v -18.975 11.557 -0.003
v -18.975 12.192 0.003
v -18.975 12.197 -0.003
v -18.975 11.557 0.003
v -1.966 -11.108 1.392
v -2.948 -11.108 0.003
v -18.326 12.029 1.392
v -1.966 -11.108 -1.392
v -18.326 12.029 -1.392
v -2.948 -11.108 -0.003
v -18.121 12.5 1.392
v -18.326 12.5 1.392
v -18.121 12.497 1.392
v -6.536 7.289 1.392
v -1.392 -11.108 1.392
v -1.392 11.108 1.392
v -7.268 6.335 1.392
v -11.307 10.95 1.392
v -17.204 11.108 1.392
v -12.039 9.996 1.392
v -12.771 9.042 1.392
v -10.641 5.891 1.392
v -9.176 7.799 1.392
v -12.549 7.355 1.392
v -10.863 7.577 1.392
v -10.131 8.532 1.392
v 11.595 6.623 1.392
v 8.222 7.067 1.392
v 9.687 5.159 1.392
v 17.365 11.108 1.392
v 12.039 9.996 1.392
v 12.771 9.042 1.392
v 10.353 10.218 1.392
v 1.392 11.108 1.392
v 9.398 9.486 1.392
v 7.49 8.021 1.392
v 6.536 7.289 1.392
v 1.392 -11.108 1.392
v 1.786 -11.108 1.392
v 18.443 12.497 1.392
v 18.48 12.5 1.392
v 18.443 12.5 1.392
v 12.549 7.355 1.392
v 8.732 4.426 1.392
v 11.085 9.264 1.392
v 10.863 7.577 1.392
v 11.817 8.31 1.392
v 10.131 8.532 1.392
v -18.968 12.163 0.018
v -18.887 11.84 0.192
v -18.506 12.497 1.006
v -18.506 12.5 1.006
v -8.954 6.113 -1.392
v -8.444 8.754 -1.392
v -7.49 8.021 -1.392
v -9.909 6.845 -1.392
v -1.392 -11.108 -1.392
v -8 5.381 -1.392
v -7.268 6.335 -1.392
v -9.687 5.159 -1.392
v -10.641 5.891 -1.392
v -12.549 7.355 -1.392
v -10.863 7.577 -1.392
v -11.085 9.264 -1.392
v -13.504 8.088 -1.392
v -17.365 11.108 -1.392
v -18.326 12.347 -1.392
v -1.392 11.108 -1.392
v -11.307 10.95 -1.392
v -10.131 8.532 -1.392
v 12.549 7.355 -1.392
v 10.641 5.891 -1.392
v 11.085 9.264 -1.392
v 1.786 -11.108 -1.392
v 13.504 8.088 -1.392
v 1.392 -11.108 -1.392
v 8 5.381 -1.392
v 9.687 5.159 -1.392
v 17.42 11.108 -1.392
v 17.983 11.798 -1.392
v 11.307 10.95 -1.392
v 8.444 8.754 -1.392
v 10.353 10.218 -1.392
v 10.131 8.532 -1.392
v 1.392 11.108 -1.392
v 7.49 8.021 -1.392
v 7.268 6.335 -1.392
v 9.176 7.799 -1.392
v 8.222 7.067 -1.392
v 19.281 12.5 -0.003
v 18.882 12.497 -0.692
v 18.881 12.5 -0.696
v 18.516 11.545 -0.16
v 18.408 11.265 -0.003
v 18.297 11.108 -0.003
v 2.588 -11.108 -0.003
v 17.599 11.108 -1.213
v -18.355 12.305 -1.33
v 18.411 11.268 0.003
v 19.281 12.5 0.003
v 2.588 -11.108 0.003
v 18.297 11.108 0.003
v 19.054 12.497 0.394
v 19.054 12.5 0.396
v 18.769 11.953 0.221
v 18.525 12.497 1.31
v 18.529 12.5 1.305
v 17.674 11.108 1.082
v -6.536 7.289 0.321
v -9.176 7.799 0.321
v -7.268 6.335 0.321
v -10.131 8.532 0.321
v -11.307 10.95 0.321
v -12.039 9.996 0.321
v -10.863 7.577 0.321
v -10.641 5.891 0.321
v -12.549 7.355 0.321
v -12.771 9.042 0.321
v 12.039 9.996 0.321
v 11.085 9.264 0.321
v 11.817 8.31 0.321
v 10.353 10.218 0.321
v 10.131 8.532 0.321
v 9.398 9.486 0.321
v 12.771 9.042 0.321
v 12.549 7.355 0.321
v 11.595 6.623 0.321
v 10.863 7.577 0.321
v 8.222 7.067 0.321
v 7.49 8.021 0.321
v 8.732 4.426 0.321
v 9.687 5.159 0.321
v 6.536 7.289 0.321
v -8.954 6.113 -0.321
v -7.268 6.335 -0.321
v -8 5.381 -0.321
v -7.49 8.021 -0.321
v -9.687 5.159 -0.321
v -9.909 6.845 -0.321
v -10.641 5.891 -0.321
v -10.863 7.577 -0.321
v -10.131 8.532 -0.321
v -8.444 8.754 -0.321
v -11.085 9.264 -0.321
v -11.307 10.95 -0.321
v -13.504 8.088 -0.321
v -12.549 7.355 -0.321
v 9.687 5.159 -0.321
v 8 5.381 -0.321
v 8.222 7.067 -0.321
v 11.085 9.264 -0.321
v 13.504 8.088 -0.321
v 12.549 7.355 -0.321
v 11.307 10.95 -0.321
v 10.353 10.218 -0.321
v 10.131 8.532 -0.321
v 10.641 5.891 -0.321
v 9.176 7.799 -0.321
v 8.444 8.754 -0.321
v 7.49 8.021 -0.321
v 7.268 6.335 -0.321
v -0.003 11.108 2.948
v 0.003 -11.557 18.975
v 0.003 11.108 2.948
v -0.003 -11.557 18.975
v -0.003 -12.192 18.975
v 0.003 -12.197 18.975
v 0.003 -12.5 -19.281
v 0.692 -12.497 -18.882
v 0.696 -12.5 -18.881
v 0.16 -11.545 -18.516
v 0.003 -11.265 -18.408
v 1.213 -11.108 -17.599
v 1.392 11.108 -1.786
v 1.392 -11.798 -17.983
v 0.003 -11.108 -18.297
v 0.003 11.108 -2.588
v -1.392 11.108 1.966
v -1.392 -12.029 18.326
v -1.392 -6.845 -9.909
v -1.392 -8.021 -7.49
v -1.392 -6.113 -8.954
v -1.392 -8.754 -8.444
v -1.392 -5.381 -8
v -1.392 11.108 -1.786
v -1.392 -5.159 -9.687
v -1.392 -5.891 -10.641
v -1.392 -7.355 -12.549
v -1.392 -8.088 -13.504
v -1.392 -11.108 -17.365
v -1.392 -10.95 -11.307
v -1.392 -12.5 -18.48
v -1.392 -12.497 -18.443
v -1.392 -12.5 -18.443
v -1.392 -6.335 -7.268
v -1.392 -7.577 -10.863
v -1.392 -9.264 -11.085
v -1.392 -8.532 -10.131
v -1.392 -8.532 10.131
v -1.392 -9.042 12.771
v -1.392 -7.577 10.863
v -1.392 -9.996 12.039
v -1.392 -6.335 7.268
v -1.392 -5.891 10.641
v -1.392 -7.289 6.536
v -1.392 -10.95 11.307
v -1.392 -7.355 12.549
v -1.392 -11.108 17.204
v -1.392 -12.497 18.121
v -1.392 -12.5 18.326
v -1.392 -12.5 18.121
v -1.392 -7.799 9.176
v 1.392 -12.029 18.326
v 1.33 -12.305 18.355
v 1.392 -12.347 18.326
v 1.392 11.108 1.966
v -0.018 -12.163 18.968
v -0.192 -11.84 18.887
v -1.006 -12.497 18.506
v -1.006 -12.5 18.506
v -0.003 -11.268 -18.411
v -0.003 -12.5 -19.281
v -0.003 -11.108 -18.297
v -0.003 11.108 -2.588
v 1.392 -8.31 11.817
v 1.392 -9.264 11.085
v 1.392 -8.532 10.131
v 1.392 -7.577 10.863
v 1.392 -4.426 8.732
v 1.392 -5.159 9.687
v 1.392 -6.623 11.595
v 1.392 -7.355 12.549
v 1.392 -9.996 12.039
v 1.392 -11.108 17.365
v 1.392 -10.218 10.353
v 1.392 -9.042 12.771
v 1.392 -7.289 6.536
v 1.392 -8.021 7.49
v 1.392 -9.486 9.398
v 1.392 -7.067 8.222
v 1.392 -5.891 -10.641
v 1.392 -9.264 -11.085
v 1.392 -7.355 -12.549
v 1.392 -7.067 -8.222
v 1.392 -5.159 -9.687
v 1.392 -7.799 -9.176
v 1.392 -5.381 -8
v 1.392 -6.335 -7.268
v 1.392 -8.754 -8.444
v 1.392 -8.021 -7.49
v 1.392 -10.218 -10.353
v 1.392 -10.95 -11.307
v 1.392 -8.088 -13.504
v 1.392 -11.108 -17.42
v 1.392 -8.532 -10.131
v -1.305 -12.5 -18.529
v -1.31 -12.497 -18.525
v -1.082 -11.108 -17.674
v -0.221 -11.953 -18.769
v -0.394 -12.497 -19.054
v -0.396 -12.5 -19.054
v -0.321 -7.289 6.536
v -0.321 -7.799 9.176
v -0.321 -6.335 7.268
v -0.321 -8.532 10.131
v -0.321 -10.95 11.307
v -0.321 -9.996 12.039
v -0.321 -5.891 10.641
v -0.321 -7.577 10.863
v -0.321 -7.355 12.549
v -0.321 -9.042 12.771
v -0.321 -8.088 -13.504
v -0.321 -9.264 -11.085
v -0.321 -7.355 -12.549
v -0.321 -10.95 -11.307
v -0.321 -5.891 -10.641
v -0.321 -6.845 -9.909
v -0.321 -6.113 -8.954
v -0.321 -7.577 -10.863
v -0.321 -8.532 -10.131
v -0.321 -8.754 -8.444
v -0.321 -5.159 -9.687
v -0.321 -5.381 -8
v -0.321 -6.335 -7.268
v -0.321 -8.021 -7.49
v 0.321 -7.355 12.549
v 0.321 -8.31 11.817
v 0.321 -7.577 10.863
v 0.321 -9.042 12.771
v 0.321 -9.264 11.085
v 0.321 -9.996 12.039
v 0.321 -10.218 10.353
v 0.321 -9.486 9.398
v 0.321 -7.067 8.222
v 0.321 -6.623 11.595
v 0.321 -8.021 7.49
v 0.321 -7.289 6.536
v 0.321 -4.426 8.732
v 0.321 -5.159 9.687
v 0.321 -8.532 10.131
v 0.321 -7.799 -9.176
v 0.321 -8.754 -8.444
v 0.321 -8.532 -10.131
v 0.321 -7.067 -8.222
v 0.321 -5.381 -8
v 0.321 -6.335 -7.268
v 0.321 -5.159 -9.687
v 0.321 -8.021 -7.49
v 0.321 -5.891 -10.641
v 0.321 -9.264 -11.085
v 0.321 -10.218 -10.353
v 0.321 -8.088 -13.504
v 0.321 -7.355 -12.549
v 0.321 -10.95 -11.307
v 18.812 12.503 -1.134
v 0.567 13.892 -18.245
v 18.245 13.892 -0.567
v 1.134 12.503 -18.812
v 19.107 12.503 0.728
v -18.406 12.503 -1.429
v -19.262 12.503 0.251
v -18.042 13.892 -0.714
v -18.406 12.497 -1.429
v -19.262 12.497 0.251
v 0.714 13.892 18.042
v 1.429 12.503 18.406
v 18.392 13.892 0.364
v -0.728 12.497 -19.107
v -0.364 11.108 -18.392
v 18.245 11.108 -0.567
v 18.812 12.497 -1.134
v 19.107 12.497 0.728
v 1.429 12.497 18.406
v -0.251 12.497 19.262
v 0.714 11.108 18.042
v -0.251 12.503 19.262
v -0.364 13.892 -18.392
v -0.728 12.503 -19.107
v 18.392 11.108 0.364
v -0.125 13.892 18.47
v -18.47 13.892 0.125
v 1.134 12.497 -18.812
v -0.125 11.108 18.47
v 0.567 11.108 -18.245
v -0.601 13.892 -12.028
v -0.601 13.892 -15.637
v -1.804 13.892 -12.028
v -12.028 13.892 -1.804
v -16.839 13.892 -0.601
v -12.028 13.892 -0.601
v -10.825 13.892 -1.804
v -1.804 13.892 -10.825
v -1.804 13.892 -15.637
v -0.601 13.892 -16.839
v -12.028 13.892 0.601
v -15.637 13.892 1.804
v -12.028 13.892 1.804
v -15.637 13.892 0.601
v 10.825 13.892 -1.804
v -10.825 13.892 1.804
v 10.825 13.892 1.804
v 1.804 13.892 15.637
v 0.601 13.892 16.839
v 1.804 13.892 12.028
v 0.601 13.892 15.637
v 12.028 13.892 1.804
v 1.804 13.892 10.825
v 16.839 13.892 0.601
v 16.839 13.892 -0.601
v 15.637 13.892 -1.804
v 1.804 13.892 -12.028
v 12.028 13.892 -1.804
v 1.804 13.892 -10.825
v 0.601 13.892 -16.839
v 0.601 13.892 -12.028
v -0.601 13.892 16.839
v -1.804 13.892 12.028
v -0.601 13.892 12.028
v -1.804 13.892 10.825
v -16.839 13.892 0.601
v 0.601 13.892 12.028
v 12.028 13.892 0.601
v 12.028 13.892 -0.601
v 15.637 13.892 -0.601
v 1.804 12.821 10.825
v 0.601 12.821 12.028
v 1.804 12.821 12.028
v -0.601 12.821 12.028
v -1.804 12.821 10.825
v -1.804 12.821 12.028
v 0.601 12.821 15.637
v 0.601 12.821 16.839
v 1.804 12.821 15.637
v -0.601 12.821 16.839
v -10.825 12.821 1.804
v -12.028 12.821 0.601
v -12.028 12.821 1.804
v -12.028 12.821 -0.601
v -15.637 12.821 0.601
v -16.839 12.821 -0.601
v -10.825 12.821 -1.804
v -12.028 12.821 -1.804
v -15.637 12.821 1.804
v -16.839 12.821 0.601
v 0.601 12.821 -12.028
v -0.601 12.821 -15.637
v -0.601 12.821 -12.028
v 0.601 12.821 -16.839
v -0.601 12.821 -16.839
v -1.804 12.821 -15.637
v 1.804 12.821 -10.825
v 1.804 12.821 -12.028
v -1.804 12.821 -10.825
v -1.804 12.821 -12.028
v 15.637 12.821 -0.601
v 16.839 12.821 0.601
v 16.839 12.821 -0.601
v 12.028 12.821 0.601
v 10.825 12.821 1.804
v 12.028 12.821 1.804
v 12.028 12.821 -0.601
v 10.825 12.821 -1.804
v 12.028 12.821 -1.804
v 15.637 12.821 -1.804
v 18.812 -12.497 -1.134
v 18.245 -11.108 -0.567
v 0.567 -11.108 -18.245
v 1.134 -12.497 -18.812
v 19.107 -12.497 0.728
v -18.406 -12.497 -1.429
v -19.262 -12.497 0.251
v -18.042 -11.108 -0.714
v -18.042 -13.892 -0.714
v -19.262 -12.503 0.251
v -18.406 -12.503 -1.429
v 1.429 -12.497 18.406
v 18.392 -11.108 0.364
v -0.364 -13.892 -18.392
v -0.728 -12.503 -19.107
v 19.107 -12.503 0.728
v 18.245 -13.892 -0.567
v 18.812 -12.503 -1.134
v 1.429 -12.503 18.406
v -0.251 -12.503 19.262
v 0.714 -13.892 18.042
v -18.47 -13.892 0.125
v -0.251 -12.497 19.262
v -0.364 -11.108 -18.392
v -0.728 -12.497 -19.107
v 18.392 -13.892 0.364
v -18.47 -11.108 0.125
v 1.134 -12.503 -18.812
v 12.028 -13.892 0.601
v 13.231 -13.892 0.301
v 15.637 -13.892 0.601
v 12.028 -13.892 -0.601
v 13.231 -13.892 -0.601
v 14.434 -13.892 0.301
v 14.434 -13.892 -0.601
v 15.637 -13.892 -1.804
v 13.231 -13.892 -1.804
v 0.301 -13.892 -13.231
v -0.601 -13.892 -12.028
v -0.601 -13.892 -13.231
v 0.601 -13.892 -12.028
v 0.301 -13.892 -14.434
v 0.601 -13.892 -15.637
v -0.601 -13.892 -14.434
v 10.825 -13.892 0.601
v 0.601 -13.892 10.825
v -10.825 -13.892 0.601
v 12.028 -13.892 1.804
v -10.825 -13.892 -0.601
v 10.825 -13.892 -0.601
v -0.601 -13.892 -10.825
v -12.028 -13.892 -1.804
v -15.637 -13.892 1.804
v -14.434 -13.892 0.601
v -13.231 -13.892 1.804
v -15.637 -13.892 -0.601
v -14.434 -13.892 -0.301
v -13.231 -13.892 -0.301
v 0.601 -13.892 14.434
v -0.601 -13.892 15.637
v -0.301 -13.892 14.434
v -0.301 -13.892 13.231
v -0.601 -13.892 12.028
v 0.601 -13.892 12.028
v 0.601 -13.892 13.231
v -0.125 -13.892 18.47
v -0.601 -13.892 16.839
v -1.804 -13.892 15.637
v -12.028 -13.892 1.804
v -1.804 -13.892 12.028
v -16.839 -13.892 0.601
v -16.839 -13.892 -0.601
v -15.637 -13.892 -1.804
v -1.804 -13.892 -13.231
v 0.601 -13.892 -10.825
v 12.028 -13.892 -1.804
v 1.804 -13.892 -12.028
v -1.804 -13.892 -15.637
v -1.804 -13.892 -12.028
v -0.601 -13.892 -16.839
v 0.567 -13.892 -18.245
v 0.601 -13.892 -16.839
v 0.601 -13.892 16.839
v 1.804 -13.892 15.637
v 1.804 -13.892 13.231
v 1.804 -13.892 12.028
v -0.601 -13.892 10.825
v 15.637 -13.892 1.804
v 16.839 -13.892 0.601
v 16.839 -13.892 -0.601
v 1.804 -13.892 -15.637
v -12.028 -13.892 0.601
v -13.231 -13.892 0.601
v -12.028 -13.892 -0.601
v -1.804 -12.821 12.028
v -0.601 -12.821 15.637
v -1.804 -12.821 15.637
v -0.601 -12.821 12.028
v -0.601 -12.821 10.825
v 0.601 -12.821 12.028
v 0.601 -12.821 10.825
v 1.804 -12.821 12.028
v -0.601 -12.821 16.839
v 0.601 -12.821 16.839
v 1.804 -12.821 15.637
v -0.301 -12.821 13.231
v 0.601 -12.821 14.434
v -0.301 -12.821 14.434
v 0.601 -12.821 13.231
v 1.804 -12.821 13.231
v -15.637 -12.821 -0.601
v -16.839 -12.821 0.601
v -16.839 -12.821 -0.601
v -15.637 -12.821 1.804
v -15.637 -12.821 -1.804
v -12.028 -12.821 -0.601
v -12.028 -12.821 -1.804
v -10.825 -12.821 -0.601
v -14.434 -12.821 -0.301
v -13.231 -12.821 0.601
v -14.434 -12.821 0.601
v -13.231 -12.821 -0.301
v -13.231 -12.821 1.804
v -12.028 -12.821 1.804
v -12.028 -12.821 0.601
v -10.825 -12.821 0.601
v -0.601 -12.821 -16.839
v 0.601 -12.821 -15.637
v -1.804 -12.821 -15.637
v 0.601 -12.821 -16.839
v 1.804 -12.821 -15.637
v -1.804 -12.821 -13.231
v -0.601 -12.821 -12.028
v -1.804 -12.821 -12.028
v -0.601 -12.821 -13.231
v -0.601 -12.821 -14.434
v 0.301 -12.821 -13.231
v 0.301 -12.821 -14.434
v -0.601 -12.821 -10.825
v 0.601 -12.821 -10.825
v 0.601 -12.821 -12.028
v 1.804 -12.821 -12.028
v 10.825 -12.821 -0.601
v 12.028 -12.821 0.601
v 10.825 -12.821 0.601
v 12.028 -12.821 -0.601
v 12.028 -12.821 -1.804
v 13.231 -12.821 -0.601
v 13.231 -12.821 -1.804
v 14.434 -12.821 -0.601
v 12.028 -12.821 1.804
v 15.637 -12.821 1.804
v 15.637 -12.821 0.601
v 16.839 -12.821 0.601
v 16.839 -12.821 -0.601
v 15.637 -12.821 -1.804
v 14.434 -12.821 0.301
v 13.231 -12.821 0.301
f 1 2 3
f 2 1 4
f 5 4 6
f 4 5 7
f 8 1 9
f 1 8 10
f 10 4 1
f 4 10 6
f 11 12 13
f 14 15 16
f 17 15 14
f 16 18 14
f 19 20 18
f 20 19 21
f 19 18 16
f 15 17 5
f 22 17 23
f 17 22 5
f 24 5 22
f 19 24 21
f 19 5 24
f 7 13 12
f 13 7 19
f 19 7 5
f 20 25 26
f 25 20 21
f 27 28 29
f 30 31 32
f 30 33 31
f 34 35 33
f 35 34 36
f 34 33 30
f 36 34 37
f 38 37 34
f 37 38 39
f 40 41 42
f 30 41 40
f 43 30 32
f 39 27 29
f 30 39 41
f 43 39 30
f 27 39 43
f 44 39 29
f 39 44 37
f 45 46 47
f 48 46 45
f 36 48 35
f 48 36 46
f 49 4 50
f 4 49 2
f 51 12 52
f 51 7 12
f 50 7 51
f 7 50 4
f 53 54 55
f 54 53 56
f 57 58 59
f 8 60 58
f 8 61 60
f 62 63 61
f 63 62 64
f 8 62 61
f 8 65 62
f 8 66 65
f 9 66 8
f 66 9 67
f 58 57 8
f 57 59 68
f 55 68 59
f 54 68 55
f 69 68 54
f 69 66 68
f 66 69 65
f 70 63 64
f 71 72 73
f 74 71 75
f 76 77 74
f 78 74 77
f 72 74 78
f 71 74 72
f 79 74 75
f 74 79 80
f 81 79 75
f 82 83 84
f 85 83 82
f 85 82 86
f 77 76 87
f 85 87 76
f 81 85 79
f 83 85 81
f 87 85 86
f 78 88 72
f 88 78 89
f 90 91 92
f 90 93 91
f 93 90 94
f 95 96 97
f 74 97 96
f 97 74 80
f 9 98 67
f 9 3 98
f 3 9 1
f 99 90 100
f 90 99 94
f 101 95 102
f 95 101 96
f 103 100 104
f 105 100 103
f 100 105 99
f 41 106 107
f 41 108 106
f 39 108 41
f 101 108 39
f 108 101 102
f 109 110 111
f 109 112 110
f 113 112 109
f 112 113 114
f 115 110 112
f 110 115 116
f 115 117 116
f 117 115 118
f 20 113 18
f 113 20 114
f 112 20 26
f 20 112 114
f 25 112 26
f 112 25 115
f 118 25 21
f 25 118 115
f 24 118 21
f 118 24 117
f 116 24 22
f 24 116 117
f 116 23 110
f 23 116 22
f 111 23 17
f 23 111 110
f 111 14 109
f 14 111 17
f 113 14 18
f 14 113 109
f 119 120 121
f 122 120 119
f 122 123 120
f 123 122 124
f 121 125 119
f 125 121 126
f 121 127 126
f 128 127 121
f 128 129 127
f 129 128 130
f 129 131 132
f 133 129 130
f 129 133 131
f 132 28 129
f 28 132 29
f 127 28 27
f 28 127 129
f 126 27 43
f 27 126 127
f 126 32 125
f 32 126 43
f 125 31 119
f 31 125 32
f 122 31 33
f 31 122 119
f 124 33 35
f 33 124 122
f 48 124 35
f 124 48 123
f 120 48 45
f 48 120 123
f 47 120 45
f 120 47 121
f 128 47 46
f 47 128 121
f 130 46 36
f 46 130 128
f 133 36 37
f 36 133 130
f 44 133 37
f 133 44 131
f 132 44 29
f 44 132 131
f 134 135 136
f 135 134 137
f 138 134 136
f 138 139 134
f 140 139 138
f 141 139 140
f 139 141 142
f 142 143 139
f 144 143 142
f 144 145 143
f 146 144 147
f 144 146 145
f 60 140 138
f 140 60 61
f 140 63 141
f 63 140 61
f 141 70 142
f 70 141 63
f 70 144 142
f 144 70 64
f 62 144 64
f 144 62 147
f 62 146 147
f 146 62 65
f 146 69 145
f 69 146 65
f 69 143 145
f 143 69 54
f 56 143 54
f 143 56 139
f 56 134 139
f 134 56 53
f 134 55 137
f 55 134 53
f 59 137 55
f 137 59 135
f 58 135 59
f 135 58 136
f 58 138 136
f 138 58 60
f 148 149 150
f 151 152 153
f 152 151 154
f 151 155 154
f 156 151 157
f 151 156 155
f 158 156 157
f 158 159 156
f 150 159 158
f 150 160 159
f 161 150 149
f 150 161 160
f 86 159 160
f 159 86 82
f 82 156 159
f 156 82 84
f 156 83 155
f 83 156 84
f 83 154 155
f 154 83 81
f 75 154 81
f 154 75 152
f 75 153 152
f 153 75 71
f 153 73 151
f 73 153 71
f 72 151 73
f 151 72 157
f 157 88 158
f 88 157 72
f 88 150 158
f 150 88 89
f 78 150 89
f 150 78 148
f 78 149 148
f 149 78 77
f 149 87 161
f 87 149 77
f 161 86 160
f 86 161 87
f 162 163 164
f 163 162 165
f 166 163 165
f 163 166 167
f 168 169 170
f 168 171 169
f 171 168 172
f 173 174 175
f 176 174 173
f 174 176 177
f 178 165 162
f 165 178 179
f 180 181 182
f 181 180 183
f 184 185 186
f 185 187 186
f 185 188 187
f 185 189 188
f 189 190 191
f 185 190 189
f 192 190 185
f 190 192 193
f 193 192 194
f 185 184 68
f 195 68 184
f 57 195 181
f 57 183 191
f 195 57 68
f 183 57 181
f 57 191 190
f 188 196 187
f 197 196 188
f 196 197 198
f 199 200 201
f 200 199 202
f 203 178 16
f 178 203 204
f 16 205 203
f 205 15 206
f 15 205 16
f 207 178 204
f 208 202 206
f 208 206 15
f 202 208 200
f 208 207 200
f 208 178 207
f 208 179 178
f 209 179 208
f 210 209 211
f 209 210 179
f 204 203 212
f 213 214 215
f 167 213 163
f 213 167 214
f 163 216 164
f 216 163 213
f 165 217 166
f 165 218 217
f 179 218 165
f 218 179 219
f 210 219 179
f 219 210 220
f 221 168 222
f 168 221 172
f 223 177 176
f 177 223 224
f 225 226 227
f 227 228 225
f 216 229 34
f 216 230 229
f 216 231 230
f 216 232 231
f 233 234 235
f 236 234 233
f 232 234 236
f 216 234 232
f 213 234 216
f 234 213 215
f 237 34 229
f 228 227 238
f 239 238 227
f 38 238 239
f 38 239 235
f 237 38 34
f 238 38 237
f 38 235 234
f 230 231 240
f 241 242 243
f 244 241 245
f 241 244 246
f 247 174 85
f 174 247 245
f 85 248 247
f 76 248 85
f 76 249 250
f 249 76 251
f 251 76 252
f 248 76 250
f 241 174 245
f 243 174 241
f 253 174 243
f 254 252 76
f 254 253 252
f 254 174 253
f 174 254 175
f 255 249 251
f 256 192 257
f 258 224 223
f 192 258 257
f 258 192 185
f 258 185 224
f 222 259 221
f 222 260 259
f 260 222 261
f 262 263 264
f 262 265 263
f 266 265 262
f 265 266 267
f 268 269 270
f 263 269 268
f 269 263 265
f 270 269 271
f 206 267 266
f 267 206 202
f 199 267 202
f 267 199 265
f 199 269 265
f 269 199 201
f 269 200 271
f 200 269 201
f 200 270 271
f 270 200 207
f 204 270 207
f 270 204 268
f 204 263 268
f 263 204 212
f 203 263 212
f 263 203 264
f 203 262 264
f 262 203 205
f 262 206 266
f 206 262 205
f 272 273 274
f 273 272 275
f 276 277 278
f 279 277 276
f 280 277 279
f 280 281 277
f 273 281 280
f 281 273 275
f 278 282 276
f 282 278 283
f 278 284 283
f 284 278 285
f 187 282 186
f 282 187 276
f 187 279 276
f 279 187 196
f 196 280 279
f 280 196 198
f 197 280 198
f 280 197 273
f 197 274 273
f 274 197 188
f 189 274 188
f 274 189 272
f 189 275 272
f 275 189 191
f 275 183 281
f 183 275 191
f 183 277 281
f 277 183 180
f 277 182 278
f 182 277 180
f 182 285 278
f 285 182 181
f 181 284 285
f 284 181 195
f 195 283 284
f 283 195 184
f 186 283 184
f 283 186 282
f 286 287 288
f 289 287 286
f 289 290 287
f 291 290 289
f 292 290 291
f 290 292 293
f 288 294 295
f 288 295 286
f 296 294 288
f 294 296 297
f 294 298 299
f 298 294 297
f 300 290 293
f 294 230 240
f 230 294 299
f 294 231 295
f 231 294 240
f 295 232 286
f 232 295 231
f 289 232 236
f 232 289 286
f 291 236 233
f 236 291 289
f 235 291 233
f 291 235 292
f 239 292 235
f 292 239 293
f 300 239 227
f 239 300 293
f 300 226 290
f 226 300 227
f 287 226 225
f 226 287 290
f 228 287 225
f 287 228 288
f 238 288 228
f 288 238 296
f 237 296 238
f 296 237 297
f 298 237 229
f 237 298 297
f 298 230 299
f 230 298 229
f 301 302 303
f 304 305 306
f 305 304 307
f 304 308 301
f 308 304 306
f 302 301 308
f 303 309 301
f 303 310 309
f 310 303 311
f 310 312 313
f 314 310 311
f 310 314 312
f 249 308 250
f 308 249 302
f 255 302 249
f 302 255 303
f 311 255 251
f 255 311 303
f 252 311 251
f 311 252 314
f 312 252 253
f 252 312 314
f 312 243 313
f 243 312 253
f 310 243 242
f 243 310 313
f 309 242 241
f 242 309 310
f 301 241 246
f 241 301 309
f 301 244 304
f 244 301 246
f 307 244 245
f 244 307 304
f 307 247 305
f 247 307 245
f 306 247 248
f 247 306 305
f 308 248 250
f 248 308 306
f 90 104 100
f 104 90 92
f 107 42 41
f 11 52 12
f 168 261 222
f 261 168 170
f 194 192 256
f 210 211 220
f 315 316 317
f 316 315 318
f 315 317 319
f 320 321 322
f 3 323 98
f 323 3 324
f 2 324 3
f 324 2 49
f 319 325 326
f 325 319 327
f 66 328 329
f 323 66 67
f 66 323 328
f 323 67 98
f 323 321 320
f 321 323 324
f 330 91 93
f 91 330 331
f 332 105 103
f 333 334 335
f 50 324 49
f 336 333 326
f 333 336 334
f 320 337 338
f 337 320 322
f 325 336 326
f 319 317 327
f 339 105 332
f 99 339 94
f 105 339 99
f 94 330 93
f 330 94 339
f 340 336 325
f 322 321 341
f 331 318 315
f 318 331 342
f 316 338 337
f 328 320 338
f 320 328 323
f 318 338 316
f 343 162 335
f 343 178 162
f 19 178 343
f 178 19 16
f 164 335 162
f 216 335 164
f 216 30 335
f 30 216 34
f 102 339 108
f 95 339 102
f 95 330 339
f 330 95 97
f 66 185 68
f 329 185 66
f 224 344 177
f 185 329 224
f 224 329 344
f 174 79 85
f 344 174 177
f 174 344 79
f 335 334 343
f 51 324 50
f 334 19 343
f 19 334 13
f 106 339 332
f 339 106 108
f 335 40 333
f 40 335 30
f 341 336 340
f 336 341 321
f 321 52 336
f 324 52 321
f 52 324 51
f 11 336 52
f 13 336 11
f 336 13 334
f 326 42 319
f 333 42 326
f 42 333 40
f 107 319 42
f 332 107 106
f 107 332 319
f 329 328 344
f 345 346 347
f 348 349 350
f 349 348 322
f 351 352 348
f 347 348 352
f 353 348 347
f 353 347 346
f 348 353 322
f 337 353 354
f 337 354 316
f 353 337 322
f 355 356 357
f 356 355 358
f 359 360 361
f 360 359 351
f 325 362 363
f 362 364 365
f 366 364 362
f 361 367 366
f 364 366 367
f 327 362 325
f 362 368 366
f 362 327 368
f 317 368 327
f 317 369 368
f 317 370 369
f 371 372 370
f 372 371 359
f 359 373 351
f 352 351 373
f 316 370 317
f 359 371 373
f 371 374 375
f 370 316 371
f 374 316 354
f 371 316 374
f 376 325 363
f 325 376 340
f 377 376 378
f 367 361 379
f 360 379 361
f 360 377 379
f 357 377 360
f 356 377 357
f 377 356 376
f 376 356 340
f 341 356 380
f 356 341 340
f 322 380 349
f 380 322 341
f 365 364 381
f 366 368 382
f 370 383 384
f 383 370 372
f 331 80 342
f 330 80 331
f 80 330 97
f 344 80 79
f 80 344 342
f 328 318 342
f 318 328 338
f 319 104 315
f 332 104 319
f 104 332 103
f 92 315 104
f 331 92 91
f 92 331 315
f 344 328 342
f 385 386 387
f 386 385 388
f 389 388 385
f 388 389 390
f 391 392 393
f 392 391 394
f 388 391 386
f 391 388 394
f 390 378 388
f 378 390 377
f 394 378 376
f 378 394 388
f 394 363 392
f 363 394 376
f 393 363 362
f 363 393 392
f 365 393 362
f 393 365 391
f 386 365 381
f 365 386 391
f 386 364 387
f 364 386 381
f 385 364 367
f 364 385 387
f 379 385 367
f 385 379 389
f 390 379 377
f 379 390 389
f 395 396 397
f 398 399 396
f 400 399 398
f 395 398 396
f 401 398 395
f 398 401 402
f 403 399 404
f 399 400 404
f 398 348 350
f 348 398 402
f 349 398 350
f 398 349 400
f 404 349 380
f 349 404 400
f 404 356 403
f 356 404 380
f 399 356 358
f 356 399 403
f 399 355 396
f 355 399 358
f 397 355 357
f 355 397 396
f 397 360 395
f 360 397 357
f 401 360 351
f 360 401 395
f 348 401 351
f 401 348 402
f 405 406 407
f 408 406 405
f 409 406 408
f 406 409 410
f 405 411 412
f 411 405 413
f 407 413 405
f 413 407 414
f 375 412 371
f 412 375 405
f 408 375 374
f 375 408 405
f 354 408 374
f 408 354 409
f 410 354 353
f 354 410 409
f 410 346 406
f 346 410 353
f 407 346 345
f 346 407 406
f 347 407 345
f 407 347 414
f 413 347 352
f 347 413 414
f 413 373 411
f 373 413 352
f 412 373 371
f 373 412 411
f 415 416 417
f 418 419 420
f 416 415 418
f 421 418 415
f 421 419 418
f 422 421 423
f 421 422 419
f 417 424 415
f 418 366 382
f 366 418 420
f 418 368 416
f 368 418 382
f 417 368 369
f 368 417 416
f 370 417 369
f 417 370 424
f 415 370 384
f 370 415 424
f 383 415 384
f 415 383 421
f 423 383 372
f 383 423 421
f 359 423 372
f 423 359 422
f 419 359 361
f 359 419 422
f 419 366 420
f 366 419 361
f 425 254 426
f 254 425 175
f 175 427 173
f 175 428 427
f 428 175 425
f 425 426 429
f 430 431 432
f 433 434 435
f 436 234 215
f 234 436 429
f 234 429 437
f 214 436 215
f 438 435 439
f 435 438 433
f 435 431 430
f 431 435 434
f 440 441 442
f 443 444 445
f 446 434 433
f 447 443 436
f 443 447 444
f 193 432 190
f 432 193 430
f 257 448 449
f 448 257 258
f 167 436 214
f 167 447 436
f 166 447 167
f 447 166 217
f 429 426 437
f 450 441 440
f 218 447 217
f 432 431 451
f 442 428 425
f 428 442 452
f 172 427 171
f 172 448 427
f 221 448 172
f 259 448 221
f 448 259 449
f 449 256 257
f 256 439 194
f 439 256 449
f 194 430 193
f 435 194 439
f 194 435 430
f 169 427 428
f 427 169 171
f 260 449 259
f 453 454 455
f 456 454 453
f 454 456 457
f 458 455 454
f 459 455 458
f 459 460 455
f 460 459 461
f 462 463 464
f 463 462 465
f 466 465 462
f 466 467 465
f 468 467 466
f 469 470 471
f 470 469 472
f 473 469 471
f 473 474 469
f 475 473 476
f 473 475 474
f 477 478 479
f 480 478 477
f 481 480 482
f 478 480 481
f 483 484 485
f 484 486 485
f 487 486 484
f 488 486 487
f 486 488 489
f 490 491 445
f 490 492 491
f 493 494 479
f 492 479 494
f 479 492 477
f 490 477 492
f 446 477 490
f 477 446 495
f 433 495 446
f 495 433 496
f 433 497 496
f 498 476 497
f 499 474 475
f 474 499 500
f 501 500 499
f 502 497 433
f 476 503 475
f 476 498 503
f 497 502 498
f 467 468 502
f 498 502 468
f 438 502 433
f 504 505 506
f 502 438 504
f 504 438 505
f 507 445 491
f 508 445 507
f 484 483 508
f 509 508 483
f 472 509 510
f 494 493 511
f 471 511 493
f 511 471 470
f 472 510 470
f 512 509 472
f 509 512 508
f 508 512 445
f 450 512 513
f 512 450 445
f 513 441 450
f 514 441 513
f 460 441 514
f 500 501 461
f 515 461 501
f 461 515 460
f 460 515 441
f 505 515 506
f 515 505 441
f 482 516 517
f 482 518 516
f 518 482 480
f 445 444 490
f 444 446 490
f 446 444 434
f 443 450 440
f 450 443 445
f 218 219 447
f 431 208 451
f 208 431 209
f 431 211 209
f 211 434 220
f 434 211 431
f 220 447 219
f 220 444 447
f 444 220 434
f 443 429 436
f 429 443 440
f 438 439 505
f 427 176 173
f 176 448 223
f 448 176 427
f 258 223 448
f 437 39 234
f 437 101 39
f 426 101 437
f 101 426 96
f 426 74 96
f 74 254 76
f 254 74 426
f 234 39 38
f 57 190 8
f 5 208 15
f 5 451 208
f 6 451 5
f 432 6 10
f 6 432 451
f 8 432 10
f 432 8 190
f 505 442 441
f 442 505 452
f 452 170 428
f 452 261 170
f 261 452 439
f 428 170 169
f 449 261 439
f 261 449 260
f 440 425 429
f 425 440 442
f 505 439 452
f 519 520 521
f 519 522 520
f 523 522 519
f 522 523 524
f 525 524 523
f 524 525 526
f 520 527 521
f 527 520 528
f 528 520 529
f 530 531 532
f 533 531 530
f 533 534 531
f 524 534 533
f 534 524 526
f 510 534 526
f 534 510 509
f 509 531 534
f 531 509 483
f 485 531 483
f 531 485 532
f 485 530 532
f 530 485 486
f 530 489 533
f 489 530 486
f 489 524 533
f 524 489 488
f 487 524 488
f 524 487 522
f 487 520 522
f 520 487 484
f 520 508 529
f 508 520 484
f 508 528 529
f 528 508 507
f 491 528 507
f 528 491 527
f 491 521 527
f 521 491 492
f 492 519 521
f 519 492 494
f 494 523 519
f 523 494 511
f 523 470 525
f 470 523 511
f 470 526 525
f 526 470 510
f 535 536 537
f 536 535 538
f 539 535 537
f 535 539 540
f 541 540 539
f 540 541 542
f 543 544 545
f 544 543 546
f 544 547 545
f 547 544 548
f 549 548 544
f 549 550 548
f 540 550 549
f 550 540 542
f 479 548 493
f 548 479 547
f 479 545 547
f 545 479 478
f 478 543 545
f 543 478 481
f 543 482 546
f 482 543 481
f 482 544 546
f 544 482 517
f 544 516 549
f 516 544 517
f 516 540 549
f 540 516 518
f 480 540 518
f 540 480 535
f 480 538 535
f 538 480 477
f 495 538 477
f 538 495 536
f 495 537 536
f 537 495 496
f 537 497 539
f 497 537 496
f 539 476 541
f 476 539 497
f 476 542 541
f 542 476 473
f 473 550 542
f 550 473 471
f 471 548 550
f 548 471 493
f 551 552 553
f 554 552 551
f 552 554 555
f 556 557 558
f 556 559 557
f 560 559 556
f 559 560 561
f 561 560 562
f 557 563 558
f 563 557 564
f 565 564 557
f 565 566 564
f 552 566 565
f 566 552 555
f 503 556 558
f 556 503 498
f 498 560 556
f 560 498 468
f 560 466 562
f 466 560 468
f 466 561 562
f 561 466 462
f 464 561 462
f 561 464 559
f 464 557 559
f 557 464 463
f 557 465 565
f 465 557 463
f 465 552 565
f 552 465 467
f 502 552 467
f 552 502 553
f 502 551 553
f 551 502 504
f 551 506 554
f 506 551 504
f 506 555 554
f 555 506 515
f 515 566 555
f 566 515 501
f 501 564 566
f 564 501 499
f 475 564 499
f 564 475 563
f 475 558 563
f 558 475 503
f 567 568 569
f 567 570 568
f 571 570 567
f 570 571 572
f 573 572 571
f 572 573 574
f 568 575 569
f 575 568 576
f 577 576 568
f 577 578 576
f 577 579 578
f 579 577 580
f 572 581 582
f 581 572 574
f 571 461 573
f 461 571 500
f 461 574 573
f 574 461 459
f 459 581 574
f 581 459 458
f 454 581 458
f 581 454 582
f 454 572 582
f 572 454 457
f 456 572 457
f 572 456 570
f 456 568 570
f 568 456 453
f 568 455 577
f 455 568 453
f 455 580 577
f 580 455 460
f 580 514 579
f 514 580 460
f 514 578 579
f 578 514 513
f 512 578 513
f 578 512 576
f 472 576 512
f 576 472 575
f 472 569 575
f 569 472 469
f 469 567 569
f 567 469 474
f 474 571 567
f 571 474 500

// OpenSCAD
diameter = 25*sqrt(3);
plane_thickness = diameter/27;
halfplane_emboss = plane_thickness / 5;
center_emboss = plane_thickness * 4/7;

module plane(){
	minkowski(){
 		linear_extrude(height=plane_thickness /300, center=true){
			child(0);
		}
		sphere(plane_thickness, $fn = 5);
	}
}

module halfplane(){
        translate([0,0,halfplane_emboss]){
	    linear_extrude(height=plane_thickness, center=false){
		child(0);
	    }
	}
}



module place(dir, dist=2/9){
f = diameter/36;
	rotate(dir){
	translate([0,diameter*dist,0]){
	halfplane(){
	scale([f,f,f]){
		translate([-1.5,0,0]){
			child(0);
		}
	}
	}
	}
	}
}

module tet_tri() {
	plane(){
		polygon(points=[
			[diameter * .5 * sqrt(2)/sqrt(3), diameter * .5 / sqrt(3)],
			[diameter * -.5 * sqrt(2)/sqrt(3), diameter * .5 / sqrt(3)],
			[0, diameter * -.5 / sqrt(3)]
		]);
	}
}

module hex_squ(){
	plane(){
		square([diameter / sqrt(3) ,diameter / sqrt(3)], center=true);
	}

}

one = [
	[0,0],[0,1],[1,1],[1,4],[0,4],[1,5],[2,5],[2,1],[3,1],[3,0]
];
two = [
	[0,0],[0,1],[2,3],[2,4],[1,4],[1,3],[0,3],[0,4],[1,5],[2,5],[3,4],[3,3],[1,1],[3,1],[3,0]
];
three = [
	[0,1],[2,1],[2,2],[0,2],[2,4],[0,4],[0,5],[3,5],[3,4],[2,3],[3,2],[3,1],[2,0],[1,0]
];
four = [
	[3,0],[2,0],[2,2],[0,2],[0,4],[1,5],[1,3],[2,3],[2,5],[3,5]
];
five = [
	[0,1],[2,1],[2,2],[0,2],[0,4],[0,5],[3,5],[3,4],[1,4],[1,3],[2,3],[3,2],[3,1],[2,0],[1,0]
];
six = [
	[0,1],[0,4,],[1,5,],[2,5,],[3,4],[1,4],[1,1],[2,1],[2,2],[1.25,2],[1.25,3],[2,3],[3,2],[3,1],[2,0],[1,0]
];

color("", 0.95){
   intersection(){
    union(){
	difference(){
		tet_tri();
		place([0,0,52.5]){polygon(points=four);}
		place([0,0,-52.5]){polygon(points=two);}
		place([0,180,52.5]){polygon(points=five);}
		place([0,180,-52.5]){polygon(points=three);}
		
	}
    rotate([0,90,180]) {
		difference(){
			tet_tri();
		place([0,0,52.5]){polygon(points=four);}
		place([0,0,-52.5]){polygon(points=five);}
		place([0,180,52.5]){polygon(points=two);}
		place([0,180,-52.5]){polygon(points=three);}
		}
	}
}
rotate(0, 0, 0){
cube([diameter, diameter/sqrt(3), diameter], center=true);
}
}
	translate([0,diameter/(2*sqrt(3)),0]){
		rotate([90,45,0]){
			difference(){
	   			hex_squ();
				place([0,180,45], 1/4){polygon(points=one);}
				place([0,180,135], 1/4){polygon(points=one);}
				place([0,180,-135], 1/4){polygon(points=one);}
				place([0,180,-45], 1/4){polygon(points=one);}
			}
		}
	}
	translate([0,-diameter/(2*sqrt(3)),0]){
		rotate([90,45,0]){
			difference(){
	   			hex_squ();
				place([0,0,45], 1/4){polygon(points=six);}
				place([0,0,135], 1/4){polygon(points=six);}
				place([0,0,-135], 1/4){polygon(points=six);}
				place([0,0,-45], 1/4){polygon(points=six);}
			}
		}
	}
}
